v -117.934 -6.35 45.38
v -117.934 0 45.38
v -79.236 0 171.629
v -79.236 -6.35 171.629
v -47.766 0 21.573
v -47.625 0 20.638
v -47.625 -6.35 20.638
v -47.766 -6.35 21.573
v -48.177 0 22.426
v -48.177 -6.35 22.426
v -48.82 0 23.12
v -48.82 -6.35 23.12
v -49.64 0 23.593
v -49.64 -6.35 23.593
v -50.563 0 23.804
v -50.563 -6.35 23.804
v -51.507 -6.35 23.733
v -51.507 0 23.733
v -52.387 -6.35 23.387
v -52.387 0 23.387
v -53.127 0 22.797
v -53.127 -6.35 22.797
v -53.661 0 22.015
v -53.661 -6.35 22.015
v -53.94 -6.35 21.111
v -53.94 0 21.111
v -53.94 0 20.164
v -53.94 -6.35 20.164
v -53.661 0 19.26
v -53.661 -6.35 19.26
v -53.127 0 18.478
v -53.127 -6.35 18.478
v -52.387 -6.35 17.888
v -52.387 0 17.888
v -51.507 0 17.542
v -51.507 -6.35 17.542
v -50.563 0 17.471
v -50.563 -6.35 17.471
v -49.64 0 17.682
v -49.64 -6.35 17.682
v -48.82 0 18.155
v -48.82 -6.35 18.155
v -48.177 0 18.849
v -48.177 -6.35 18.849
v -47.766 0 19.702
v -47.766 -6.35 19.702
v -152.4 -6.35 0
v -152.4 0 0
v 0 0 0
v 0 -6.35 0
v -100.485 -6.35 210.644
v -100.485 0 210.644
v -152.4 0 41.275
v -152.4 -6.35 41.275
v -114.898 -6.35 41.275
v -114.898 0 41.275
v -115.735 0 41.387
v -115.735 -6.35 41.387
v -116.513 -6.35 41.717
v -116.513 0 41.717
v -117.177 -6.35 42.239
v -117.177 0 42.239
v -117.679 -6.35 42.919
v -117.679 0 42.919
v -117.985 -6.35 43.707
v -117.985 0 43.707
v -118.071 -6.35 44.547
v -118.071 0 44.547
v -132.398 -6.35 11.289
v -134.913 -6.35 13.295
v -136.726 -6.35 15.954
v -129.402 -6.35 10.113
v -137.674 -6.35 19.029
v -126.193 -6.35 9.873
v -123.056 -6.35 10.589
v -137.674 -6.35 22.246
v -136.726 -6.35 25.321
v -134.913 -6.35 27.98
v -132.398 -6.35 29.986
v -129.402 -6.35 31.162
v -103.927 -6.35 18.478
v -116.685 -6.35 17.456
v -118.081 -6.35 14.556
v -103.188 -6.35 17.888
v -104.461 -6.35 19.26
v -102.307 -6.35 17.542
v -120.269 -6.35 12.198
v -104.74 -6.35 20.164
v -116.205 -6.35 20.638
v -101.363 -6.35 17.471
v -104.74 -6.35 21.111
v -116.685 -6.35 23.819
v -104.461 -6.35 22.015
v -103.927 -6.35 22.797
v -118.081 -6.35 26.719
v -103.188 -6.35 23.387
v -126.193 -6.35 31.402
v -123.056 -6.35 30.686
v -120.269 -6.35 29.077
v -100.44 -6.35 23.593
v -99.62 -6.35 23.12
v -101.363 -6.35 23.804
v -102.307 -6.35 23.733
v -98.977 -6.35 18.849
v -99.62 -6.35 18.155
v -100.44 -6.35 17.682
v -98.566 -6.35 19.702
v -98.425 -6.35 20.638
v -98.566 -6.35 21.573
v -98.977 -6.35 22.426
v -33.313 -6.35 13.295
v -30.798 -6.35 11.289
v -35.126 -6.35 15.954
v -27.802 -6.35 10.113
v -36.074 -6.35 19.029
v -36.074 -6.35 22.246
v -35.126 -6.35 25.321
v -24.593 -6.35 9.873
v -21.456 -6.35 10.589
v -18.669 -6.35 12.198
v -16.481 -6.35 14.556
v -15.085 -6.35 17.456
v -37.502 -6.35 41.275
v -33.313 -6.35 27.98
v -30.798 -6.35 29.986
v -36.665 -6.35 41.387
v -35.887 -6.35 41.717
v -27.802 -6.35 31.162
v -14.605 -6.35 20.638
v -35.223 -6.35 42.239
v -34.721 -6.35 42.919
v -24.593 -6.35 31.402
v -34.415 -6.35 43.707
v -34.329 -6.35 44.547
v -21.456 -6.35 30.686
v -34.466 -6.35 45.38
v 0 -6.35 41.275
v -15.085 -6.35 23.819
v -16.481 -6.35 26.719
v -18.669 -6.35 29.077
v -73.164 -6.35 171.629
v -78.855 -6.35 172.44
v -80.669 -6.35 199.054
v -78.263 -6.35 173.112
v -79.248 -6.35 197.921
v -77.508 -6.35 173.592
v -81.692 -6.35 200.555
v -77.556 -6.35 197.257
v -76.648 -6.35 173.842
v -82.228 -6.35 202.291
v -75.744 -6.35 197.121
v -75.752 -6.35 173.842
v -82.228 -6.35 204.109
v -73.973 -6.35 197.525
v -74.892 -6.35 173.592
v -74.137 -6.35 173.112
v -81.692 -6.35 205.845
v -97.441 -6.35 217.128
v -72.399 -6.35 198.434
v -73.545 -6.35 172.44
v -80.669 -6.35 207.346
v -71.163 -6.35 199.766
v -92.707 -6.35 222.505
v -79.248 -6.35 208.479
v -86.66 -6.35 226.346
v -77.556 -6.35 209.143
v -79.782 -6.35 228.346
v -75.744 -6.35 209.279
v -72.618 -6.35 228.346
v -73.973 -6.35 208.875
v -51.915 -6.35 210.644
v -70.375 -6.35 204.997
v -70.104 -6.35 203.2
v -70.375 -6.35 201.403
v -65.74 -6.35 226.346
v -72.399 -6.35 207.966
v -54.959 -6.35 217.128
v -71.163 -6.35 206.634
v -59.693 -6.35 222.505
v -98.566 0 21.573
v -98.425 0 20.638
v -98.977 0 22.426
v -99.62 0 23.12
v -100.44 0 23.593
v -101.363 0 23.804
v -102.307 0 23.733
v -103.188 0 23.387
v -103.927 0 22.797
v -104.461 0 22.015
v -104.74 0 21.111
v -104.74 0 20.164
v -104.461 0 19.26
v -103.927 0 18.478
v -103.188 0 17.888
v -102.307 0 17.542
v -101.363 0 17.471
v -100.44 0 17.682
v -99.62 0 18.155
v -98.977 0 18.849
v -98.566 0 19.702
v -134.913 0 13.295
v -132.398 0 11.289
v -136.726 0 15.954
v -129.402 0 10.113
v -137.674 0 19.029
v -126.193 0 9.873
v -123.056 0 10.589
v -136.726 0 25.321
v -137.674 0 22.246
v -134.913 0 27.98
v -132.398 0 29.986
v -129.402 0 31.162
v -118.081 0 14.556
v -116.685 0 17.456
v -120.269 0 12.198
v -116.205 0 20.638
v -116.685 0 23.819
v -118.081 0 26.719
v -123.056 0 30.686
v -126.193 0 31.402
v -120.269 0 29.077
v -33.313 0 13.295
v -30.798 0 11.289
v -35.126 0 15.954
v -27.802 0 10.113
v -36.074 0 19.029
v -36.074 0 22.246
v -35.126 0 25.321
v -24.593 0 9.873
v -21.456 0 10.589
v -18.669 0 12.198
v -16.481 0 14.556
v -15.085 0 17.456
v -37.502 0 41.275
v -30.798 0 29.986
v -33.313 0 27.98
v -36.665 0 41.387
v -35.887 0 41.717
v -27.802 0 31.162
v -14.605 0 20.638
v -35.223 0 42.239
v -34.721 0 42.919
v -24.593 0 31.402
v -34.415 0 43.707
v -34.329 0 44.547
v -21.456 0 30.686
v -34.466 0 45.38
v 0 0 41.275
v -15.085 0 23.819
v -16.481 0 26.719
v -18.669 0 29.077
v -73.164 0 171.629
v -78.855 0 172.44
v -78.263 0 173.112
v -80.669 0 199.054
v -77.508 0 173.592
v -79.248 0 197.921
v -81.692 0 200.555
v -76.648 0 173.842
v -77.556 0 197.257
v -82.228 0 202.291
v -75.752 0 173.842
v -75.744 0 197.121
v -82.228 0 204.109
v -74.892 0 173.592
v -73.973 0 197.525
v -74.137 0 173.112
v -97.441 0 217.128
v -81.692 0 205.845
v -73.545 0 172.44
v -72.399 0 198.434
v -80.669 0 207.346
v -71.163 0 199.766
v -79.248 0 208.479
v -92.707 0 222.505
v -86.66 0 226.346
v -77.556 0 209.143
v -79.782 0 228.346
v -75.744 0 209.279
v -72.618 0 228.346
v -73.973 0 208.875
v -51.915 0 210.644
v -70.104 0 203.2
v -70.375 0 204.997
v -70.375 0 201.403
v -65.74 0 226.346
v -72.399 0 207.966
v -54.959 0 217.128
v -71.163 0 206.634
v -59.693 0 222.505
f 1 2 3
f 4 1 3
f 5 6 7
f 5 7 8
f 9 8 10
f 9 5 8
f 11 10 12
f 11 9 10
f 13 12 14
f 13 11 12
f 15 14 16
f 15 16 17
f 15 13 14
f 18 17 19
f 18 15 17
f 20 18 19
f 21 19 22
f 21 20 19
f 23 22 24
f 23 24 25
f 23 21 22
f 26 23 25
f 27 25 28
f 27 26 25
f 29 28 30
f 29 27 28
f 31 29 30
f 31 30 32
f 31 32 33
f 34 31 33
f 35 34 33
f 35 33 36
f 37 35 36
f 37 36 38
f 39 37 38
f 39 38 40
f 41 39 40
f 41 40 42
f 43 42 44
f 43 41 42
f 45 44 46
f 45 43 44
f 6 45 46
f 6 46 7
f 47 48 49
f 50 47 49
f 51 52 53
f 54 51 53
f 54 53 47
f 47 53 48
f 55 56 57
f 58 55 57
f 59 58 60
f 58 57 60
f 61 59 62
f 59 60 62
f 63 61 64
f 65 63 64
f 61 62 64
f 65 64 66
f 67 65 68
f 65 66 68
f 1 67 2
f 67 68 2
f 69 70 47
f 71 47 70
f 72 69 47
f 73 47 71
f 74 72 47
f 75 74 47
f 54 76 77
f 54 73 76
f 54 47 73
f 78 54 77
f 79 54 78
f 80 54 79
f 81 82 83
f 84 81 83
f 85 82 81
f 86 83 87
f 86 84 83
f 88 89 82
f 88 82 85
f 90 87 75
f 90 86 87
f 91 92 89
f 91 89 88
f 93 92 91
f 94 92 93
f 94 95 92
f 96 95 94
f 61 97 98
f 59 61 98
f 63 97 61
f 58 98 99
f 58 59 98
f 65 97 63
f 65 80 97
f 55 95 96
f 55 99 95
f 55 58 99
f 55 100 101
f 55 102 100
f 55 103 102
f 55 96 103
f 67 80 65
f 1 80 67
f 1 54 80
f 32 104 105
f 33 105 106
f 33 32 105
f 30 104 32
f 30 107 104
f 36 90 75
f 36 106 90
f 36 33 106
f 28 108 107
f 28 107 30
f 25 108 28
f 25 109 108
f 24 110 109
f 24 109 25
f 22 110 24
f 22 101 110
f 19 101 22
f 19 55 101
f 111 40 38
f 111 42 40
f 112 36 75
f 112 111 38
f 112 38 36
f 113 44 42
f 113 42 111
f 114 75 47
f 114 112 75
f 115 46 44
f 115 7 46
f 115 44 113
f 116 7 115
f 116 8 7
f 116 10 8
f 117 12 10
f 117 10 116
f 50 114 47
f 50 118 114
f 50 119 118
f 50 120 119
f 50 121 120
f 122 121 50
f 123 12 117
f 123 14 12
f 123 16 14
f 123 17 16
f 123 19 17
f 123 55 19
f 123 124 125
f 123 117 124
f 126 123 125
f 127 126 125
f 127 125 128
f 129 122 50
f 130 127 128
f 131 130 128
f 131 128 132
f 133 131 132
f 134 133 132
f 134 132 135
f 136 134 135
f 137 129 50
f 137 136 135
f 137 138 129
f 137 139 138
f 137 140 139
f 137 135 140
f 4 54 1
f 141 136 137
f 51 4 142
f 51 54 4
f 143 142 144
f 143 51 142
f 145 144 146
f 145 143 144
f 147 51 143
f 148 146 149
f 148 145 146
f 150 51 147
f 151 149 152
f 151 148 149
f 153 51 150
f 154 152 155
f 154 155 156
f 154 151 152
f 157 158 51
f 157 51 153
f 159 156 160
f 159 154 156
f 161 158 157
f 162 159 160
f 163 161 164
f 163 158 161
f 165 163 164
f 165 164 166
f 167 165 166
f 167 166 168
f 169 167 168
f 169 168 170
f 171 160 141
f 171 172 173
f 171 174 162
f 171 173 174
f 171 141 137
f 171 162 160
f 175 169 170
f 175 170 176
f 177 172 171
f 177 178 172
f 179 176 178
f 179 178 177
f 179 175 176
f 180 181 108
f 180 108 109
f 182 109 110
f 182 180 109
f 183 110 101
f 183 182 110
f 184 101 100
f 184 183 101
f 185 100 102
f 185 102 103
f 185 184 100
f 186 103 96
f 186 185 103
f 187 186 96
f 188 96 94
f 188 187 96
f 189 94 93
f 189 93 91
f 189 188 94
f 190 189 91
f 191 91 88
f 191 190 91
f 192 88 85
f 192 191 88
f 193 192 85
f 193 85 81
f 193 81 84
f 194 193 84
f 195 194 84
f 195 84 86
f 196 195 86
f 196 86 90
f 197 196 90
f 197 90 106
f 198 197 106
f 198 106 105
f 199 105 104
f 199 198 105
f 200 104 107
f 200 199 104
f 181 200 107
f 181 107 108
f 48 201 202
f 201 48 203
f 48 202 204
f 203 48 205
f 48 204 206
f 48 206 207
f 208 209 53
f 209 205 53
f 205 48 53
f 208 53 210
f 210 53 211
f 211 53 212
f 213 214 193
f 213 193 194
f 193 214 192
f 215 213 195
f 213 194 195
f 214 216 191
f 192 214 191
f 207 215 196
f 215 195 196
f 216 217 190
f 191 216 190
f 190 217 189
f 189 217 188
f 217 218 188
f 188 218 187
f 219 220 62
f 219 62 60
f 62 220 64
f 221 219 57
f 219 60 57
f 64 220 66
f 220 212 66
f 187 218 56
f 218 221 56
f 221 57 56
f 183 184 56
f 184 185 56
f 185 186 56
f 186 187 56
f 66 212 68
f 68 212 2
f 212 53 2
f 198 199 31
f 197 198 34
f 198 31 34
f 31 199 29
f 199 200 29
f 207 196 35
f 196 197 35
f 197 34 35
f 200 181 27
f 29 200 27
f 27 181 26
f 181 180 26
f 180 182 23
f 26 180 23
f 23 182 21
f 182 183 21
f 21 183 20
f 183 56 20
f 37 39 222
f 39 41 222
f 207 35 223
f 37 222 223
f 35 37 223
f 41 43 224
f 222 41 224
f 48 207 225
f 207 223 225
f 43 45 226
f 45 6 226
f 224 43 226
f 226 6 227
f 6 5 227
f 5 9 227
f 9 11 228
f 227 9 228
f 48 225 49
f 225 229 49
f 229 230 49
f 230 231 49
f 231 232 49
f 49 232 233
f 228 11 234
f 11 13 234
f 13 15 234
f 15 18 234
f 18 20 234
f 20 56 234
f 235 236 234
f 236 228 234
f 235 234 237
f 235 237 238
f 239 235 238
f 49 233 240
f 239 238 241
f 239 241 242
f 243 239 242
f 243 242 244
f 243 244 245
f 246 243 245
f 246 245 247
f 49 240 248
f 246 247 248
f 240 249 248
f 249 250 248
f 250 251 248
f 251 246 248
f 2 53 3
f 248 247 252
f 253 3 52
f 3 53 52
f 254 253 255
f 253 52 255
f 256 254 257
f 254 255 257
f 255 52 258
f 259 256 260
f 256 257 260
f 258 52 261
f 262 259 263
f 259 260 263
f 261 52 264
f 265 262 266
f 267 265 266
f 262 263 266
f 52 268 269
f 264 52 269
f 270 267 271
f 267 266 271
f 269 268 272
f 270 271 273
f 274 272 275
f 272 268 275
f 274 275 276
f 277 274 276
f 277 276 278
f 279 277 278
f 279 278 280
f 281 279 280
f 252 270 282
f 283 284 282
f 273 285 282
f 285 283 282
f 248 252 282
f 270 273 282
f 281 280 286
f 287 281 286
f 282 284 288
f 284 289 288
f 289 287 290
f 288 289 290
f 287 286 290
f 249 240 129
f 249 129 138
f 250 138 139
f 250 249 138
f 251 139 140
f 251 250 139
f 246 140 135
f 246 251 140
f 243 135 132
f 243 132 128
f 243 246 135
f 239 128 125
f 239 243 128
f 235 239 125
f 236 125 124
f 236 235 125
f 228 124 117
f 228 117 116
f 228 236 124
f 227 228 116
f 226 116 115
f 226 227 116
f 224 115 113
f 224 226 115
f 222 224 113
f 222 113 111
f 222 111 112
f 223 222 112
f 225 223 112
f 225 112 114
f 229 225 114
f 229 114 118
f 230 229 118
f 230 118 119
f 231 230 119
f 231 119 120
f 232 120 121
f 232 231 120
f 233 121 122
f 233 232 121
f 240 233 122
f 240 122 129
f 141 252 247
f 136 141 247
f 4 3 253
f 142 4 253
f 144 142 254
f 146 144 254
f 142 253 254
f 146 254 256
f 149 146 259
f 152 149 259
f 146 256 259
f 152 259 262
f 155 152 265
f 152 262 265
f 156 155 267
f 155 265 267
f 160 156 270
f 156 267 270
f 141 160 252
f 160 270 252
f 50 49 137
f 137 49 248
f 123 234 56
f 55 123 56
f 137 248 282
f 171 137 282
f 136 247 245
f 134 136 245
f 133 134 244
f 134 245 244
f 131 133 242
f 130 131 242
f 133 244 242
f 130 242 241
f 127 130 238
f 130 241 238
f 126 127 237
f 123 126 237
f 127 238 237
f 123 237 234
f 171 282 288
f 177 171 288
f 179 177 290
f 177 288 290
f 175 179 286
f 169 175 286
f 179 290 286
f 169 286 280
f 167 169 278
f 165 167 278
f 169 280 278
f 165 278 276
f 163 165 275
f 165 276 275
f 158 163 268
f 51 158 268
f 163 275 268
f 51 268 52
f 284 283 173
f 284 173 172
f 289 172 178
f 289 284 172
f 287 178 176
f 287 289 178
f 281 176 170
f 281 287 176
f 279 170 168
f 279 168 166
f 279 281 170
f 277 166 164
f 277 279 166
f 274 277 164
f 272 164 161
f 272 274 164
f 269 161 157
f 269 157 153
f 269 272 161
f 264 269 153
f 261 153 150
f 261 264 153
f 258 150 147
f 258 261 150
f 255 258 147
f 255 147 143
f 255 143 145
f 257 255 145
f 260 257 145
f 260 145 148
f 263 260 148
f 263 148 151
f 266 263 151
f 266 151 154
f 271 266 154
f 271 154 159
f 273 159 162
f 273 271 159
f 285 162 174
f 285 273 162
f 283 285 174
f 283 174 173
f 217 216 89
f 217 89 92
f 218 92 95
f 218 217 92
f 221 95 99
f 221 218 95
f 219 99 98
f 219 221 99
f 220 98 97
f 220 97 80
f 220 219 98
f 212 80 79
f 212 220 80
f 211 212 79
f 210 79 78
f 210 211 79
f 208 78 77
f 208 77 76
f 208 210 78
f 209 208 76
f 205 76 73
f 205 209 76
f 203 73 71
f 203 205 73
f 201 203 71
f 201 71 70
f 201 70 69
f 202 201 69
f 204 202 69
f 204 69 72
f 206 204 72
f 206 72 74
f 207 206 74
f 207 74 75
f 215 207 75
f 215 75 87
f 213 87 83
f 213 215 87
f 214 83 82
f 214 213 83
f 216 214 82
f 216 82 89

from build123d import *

# Parameters (mm, degrees)
F0_R     = 10.795
F0_R_2   = 3.175
F0_R_3   = 6.096
F1_DEPTH = 6.35


with BuildPart() as f1:
    # F0 (on Front) → F1 (new body)
    with BuildSketch(Plane.XZ):
        with BuildLine():
            Line((-152.4, 0), (0, 0))
            Line((0, 0), (0, 41.275))
            Line((0, 41.275), (-51.915237, 210.64381))
            ThreePointArc((-51.915237, 210.64381), (-76.2, 228.6), (-100.484763, 210.64381))
            Line((-100.484763, 210.64381), (-152.4, 41.275))
            Line((-152.4, 41.275), (-152.4, 0))
        make_face()
        with Locations((-127, 20.6375)):
            Circle(F0_R, mode=Mode.SUBTRACT)
        with Locations((-101.6, 20.6375)):
            Circle(F0_R_2, mode=Mode.SUBTRACT)
        with Locations((-50.8, 20.6375)):
            Circle(F0_R_2, mode=Mode.SUBTRACT)
        with Locations((-25.4, 20.6375)):
            Circle(F0_R, mode=Mode.SUBTRACT)
        with BuildLine():
            Line((-37.502079, 41.275), (-114.897921, 41.275))
            ThreePointArc((-114.897921, 41.275), (-117.450849, 42.562361), (-117.933516, 45.380476))
            Line((-117.933516, 45.380476), (-79.235595, 171.628974))
            ThreePointArc((-79.235595, 171.628974), (-76.2, 173.873498), (-73.164405, 171.628974))
            Line((-73.164405, 171.628974), (-34.466484, 45.380476))
            ThreePointArc((-34.466484, 45.380476), (-34.949151, 42.562361), (-37.502079, 41.275))
        make_face(mode=Mode.SUBTRACT)
        with Locations((-76.2, 203.2)):
            Circle(F0_R_3, mode=Mode.SUBTRACT)
    extrude(amount=F1_DEPTH)


solid = f1.part
